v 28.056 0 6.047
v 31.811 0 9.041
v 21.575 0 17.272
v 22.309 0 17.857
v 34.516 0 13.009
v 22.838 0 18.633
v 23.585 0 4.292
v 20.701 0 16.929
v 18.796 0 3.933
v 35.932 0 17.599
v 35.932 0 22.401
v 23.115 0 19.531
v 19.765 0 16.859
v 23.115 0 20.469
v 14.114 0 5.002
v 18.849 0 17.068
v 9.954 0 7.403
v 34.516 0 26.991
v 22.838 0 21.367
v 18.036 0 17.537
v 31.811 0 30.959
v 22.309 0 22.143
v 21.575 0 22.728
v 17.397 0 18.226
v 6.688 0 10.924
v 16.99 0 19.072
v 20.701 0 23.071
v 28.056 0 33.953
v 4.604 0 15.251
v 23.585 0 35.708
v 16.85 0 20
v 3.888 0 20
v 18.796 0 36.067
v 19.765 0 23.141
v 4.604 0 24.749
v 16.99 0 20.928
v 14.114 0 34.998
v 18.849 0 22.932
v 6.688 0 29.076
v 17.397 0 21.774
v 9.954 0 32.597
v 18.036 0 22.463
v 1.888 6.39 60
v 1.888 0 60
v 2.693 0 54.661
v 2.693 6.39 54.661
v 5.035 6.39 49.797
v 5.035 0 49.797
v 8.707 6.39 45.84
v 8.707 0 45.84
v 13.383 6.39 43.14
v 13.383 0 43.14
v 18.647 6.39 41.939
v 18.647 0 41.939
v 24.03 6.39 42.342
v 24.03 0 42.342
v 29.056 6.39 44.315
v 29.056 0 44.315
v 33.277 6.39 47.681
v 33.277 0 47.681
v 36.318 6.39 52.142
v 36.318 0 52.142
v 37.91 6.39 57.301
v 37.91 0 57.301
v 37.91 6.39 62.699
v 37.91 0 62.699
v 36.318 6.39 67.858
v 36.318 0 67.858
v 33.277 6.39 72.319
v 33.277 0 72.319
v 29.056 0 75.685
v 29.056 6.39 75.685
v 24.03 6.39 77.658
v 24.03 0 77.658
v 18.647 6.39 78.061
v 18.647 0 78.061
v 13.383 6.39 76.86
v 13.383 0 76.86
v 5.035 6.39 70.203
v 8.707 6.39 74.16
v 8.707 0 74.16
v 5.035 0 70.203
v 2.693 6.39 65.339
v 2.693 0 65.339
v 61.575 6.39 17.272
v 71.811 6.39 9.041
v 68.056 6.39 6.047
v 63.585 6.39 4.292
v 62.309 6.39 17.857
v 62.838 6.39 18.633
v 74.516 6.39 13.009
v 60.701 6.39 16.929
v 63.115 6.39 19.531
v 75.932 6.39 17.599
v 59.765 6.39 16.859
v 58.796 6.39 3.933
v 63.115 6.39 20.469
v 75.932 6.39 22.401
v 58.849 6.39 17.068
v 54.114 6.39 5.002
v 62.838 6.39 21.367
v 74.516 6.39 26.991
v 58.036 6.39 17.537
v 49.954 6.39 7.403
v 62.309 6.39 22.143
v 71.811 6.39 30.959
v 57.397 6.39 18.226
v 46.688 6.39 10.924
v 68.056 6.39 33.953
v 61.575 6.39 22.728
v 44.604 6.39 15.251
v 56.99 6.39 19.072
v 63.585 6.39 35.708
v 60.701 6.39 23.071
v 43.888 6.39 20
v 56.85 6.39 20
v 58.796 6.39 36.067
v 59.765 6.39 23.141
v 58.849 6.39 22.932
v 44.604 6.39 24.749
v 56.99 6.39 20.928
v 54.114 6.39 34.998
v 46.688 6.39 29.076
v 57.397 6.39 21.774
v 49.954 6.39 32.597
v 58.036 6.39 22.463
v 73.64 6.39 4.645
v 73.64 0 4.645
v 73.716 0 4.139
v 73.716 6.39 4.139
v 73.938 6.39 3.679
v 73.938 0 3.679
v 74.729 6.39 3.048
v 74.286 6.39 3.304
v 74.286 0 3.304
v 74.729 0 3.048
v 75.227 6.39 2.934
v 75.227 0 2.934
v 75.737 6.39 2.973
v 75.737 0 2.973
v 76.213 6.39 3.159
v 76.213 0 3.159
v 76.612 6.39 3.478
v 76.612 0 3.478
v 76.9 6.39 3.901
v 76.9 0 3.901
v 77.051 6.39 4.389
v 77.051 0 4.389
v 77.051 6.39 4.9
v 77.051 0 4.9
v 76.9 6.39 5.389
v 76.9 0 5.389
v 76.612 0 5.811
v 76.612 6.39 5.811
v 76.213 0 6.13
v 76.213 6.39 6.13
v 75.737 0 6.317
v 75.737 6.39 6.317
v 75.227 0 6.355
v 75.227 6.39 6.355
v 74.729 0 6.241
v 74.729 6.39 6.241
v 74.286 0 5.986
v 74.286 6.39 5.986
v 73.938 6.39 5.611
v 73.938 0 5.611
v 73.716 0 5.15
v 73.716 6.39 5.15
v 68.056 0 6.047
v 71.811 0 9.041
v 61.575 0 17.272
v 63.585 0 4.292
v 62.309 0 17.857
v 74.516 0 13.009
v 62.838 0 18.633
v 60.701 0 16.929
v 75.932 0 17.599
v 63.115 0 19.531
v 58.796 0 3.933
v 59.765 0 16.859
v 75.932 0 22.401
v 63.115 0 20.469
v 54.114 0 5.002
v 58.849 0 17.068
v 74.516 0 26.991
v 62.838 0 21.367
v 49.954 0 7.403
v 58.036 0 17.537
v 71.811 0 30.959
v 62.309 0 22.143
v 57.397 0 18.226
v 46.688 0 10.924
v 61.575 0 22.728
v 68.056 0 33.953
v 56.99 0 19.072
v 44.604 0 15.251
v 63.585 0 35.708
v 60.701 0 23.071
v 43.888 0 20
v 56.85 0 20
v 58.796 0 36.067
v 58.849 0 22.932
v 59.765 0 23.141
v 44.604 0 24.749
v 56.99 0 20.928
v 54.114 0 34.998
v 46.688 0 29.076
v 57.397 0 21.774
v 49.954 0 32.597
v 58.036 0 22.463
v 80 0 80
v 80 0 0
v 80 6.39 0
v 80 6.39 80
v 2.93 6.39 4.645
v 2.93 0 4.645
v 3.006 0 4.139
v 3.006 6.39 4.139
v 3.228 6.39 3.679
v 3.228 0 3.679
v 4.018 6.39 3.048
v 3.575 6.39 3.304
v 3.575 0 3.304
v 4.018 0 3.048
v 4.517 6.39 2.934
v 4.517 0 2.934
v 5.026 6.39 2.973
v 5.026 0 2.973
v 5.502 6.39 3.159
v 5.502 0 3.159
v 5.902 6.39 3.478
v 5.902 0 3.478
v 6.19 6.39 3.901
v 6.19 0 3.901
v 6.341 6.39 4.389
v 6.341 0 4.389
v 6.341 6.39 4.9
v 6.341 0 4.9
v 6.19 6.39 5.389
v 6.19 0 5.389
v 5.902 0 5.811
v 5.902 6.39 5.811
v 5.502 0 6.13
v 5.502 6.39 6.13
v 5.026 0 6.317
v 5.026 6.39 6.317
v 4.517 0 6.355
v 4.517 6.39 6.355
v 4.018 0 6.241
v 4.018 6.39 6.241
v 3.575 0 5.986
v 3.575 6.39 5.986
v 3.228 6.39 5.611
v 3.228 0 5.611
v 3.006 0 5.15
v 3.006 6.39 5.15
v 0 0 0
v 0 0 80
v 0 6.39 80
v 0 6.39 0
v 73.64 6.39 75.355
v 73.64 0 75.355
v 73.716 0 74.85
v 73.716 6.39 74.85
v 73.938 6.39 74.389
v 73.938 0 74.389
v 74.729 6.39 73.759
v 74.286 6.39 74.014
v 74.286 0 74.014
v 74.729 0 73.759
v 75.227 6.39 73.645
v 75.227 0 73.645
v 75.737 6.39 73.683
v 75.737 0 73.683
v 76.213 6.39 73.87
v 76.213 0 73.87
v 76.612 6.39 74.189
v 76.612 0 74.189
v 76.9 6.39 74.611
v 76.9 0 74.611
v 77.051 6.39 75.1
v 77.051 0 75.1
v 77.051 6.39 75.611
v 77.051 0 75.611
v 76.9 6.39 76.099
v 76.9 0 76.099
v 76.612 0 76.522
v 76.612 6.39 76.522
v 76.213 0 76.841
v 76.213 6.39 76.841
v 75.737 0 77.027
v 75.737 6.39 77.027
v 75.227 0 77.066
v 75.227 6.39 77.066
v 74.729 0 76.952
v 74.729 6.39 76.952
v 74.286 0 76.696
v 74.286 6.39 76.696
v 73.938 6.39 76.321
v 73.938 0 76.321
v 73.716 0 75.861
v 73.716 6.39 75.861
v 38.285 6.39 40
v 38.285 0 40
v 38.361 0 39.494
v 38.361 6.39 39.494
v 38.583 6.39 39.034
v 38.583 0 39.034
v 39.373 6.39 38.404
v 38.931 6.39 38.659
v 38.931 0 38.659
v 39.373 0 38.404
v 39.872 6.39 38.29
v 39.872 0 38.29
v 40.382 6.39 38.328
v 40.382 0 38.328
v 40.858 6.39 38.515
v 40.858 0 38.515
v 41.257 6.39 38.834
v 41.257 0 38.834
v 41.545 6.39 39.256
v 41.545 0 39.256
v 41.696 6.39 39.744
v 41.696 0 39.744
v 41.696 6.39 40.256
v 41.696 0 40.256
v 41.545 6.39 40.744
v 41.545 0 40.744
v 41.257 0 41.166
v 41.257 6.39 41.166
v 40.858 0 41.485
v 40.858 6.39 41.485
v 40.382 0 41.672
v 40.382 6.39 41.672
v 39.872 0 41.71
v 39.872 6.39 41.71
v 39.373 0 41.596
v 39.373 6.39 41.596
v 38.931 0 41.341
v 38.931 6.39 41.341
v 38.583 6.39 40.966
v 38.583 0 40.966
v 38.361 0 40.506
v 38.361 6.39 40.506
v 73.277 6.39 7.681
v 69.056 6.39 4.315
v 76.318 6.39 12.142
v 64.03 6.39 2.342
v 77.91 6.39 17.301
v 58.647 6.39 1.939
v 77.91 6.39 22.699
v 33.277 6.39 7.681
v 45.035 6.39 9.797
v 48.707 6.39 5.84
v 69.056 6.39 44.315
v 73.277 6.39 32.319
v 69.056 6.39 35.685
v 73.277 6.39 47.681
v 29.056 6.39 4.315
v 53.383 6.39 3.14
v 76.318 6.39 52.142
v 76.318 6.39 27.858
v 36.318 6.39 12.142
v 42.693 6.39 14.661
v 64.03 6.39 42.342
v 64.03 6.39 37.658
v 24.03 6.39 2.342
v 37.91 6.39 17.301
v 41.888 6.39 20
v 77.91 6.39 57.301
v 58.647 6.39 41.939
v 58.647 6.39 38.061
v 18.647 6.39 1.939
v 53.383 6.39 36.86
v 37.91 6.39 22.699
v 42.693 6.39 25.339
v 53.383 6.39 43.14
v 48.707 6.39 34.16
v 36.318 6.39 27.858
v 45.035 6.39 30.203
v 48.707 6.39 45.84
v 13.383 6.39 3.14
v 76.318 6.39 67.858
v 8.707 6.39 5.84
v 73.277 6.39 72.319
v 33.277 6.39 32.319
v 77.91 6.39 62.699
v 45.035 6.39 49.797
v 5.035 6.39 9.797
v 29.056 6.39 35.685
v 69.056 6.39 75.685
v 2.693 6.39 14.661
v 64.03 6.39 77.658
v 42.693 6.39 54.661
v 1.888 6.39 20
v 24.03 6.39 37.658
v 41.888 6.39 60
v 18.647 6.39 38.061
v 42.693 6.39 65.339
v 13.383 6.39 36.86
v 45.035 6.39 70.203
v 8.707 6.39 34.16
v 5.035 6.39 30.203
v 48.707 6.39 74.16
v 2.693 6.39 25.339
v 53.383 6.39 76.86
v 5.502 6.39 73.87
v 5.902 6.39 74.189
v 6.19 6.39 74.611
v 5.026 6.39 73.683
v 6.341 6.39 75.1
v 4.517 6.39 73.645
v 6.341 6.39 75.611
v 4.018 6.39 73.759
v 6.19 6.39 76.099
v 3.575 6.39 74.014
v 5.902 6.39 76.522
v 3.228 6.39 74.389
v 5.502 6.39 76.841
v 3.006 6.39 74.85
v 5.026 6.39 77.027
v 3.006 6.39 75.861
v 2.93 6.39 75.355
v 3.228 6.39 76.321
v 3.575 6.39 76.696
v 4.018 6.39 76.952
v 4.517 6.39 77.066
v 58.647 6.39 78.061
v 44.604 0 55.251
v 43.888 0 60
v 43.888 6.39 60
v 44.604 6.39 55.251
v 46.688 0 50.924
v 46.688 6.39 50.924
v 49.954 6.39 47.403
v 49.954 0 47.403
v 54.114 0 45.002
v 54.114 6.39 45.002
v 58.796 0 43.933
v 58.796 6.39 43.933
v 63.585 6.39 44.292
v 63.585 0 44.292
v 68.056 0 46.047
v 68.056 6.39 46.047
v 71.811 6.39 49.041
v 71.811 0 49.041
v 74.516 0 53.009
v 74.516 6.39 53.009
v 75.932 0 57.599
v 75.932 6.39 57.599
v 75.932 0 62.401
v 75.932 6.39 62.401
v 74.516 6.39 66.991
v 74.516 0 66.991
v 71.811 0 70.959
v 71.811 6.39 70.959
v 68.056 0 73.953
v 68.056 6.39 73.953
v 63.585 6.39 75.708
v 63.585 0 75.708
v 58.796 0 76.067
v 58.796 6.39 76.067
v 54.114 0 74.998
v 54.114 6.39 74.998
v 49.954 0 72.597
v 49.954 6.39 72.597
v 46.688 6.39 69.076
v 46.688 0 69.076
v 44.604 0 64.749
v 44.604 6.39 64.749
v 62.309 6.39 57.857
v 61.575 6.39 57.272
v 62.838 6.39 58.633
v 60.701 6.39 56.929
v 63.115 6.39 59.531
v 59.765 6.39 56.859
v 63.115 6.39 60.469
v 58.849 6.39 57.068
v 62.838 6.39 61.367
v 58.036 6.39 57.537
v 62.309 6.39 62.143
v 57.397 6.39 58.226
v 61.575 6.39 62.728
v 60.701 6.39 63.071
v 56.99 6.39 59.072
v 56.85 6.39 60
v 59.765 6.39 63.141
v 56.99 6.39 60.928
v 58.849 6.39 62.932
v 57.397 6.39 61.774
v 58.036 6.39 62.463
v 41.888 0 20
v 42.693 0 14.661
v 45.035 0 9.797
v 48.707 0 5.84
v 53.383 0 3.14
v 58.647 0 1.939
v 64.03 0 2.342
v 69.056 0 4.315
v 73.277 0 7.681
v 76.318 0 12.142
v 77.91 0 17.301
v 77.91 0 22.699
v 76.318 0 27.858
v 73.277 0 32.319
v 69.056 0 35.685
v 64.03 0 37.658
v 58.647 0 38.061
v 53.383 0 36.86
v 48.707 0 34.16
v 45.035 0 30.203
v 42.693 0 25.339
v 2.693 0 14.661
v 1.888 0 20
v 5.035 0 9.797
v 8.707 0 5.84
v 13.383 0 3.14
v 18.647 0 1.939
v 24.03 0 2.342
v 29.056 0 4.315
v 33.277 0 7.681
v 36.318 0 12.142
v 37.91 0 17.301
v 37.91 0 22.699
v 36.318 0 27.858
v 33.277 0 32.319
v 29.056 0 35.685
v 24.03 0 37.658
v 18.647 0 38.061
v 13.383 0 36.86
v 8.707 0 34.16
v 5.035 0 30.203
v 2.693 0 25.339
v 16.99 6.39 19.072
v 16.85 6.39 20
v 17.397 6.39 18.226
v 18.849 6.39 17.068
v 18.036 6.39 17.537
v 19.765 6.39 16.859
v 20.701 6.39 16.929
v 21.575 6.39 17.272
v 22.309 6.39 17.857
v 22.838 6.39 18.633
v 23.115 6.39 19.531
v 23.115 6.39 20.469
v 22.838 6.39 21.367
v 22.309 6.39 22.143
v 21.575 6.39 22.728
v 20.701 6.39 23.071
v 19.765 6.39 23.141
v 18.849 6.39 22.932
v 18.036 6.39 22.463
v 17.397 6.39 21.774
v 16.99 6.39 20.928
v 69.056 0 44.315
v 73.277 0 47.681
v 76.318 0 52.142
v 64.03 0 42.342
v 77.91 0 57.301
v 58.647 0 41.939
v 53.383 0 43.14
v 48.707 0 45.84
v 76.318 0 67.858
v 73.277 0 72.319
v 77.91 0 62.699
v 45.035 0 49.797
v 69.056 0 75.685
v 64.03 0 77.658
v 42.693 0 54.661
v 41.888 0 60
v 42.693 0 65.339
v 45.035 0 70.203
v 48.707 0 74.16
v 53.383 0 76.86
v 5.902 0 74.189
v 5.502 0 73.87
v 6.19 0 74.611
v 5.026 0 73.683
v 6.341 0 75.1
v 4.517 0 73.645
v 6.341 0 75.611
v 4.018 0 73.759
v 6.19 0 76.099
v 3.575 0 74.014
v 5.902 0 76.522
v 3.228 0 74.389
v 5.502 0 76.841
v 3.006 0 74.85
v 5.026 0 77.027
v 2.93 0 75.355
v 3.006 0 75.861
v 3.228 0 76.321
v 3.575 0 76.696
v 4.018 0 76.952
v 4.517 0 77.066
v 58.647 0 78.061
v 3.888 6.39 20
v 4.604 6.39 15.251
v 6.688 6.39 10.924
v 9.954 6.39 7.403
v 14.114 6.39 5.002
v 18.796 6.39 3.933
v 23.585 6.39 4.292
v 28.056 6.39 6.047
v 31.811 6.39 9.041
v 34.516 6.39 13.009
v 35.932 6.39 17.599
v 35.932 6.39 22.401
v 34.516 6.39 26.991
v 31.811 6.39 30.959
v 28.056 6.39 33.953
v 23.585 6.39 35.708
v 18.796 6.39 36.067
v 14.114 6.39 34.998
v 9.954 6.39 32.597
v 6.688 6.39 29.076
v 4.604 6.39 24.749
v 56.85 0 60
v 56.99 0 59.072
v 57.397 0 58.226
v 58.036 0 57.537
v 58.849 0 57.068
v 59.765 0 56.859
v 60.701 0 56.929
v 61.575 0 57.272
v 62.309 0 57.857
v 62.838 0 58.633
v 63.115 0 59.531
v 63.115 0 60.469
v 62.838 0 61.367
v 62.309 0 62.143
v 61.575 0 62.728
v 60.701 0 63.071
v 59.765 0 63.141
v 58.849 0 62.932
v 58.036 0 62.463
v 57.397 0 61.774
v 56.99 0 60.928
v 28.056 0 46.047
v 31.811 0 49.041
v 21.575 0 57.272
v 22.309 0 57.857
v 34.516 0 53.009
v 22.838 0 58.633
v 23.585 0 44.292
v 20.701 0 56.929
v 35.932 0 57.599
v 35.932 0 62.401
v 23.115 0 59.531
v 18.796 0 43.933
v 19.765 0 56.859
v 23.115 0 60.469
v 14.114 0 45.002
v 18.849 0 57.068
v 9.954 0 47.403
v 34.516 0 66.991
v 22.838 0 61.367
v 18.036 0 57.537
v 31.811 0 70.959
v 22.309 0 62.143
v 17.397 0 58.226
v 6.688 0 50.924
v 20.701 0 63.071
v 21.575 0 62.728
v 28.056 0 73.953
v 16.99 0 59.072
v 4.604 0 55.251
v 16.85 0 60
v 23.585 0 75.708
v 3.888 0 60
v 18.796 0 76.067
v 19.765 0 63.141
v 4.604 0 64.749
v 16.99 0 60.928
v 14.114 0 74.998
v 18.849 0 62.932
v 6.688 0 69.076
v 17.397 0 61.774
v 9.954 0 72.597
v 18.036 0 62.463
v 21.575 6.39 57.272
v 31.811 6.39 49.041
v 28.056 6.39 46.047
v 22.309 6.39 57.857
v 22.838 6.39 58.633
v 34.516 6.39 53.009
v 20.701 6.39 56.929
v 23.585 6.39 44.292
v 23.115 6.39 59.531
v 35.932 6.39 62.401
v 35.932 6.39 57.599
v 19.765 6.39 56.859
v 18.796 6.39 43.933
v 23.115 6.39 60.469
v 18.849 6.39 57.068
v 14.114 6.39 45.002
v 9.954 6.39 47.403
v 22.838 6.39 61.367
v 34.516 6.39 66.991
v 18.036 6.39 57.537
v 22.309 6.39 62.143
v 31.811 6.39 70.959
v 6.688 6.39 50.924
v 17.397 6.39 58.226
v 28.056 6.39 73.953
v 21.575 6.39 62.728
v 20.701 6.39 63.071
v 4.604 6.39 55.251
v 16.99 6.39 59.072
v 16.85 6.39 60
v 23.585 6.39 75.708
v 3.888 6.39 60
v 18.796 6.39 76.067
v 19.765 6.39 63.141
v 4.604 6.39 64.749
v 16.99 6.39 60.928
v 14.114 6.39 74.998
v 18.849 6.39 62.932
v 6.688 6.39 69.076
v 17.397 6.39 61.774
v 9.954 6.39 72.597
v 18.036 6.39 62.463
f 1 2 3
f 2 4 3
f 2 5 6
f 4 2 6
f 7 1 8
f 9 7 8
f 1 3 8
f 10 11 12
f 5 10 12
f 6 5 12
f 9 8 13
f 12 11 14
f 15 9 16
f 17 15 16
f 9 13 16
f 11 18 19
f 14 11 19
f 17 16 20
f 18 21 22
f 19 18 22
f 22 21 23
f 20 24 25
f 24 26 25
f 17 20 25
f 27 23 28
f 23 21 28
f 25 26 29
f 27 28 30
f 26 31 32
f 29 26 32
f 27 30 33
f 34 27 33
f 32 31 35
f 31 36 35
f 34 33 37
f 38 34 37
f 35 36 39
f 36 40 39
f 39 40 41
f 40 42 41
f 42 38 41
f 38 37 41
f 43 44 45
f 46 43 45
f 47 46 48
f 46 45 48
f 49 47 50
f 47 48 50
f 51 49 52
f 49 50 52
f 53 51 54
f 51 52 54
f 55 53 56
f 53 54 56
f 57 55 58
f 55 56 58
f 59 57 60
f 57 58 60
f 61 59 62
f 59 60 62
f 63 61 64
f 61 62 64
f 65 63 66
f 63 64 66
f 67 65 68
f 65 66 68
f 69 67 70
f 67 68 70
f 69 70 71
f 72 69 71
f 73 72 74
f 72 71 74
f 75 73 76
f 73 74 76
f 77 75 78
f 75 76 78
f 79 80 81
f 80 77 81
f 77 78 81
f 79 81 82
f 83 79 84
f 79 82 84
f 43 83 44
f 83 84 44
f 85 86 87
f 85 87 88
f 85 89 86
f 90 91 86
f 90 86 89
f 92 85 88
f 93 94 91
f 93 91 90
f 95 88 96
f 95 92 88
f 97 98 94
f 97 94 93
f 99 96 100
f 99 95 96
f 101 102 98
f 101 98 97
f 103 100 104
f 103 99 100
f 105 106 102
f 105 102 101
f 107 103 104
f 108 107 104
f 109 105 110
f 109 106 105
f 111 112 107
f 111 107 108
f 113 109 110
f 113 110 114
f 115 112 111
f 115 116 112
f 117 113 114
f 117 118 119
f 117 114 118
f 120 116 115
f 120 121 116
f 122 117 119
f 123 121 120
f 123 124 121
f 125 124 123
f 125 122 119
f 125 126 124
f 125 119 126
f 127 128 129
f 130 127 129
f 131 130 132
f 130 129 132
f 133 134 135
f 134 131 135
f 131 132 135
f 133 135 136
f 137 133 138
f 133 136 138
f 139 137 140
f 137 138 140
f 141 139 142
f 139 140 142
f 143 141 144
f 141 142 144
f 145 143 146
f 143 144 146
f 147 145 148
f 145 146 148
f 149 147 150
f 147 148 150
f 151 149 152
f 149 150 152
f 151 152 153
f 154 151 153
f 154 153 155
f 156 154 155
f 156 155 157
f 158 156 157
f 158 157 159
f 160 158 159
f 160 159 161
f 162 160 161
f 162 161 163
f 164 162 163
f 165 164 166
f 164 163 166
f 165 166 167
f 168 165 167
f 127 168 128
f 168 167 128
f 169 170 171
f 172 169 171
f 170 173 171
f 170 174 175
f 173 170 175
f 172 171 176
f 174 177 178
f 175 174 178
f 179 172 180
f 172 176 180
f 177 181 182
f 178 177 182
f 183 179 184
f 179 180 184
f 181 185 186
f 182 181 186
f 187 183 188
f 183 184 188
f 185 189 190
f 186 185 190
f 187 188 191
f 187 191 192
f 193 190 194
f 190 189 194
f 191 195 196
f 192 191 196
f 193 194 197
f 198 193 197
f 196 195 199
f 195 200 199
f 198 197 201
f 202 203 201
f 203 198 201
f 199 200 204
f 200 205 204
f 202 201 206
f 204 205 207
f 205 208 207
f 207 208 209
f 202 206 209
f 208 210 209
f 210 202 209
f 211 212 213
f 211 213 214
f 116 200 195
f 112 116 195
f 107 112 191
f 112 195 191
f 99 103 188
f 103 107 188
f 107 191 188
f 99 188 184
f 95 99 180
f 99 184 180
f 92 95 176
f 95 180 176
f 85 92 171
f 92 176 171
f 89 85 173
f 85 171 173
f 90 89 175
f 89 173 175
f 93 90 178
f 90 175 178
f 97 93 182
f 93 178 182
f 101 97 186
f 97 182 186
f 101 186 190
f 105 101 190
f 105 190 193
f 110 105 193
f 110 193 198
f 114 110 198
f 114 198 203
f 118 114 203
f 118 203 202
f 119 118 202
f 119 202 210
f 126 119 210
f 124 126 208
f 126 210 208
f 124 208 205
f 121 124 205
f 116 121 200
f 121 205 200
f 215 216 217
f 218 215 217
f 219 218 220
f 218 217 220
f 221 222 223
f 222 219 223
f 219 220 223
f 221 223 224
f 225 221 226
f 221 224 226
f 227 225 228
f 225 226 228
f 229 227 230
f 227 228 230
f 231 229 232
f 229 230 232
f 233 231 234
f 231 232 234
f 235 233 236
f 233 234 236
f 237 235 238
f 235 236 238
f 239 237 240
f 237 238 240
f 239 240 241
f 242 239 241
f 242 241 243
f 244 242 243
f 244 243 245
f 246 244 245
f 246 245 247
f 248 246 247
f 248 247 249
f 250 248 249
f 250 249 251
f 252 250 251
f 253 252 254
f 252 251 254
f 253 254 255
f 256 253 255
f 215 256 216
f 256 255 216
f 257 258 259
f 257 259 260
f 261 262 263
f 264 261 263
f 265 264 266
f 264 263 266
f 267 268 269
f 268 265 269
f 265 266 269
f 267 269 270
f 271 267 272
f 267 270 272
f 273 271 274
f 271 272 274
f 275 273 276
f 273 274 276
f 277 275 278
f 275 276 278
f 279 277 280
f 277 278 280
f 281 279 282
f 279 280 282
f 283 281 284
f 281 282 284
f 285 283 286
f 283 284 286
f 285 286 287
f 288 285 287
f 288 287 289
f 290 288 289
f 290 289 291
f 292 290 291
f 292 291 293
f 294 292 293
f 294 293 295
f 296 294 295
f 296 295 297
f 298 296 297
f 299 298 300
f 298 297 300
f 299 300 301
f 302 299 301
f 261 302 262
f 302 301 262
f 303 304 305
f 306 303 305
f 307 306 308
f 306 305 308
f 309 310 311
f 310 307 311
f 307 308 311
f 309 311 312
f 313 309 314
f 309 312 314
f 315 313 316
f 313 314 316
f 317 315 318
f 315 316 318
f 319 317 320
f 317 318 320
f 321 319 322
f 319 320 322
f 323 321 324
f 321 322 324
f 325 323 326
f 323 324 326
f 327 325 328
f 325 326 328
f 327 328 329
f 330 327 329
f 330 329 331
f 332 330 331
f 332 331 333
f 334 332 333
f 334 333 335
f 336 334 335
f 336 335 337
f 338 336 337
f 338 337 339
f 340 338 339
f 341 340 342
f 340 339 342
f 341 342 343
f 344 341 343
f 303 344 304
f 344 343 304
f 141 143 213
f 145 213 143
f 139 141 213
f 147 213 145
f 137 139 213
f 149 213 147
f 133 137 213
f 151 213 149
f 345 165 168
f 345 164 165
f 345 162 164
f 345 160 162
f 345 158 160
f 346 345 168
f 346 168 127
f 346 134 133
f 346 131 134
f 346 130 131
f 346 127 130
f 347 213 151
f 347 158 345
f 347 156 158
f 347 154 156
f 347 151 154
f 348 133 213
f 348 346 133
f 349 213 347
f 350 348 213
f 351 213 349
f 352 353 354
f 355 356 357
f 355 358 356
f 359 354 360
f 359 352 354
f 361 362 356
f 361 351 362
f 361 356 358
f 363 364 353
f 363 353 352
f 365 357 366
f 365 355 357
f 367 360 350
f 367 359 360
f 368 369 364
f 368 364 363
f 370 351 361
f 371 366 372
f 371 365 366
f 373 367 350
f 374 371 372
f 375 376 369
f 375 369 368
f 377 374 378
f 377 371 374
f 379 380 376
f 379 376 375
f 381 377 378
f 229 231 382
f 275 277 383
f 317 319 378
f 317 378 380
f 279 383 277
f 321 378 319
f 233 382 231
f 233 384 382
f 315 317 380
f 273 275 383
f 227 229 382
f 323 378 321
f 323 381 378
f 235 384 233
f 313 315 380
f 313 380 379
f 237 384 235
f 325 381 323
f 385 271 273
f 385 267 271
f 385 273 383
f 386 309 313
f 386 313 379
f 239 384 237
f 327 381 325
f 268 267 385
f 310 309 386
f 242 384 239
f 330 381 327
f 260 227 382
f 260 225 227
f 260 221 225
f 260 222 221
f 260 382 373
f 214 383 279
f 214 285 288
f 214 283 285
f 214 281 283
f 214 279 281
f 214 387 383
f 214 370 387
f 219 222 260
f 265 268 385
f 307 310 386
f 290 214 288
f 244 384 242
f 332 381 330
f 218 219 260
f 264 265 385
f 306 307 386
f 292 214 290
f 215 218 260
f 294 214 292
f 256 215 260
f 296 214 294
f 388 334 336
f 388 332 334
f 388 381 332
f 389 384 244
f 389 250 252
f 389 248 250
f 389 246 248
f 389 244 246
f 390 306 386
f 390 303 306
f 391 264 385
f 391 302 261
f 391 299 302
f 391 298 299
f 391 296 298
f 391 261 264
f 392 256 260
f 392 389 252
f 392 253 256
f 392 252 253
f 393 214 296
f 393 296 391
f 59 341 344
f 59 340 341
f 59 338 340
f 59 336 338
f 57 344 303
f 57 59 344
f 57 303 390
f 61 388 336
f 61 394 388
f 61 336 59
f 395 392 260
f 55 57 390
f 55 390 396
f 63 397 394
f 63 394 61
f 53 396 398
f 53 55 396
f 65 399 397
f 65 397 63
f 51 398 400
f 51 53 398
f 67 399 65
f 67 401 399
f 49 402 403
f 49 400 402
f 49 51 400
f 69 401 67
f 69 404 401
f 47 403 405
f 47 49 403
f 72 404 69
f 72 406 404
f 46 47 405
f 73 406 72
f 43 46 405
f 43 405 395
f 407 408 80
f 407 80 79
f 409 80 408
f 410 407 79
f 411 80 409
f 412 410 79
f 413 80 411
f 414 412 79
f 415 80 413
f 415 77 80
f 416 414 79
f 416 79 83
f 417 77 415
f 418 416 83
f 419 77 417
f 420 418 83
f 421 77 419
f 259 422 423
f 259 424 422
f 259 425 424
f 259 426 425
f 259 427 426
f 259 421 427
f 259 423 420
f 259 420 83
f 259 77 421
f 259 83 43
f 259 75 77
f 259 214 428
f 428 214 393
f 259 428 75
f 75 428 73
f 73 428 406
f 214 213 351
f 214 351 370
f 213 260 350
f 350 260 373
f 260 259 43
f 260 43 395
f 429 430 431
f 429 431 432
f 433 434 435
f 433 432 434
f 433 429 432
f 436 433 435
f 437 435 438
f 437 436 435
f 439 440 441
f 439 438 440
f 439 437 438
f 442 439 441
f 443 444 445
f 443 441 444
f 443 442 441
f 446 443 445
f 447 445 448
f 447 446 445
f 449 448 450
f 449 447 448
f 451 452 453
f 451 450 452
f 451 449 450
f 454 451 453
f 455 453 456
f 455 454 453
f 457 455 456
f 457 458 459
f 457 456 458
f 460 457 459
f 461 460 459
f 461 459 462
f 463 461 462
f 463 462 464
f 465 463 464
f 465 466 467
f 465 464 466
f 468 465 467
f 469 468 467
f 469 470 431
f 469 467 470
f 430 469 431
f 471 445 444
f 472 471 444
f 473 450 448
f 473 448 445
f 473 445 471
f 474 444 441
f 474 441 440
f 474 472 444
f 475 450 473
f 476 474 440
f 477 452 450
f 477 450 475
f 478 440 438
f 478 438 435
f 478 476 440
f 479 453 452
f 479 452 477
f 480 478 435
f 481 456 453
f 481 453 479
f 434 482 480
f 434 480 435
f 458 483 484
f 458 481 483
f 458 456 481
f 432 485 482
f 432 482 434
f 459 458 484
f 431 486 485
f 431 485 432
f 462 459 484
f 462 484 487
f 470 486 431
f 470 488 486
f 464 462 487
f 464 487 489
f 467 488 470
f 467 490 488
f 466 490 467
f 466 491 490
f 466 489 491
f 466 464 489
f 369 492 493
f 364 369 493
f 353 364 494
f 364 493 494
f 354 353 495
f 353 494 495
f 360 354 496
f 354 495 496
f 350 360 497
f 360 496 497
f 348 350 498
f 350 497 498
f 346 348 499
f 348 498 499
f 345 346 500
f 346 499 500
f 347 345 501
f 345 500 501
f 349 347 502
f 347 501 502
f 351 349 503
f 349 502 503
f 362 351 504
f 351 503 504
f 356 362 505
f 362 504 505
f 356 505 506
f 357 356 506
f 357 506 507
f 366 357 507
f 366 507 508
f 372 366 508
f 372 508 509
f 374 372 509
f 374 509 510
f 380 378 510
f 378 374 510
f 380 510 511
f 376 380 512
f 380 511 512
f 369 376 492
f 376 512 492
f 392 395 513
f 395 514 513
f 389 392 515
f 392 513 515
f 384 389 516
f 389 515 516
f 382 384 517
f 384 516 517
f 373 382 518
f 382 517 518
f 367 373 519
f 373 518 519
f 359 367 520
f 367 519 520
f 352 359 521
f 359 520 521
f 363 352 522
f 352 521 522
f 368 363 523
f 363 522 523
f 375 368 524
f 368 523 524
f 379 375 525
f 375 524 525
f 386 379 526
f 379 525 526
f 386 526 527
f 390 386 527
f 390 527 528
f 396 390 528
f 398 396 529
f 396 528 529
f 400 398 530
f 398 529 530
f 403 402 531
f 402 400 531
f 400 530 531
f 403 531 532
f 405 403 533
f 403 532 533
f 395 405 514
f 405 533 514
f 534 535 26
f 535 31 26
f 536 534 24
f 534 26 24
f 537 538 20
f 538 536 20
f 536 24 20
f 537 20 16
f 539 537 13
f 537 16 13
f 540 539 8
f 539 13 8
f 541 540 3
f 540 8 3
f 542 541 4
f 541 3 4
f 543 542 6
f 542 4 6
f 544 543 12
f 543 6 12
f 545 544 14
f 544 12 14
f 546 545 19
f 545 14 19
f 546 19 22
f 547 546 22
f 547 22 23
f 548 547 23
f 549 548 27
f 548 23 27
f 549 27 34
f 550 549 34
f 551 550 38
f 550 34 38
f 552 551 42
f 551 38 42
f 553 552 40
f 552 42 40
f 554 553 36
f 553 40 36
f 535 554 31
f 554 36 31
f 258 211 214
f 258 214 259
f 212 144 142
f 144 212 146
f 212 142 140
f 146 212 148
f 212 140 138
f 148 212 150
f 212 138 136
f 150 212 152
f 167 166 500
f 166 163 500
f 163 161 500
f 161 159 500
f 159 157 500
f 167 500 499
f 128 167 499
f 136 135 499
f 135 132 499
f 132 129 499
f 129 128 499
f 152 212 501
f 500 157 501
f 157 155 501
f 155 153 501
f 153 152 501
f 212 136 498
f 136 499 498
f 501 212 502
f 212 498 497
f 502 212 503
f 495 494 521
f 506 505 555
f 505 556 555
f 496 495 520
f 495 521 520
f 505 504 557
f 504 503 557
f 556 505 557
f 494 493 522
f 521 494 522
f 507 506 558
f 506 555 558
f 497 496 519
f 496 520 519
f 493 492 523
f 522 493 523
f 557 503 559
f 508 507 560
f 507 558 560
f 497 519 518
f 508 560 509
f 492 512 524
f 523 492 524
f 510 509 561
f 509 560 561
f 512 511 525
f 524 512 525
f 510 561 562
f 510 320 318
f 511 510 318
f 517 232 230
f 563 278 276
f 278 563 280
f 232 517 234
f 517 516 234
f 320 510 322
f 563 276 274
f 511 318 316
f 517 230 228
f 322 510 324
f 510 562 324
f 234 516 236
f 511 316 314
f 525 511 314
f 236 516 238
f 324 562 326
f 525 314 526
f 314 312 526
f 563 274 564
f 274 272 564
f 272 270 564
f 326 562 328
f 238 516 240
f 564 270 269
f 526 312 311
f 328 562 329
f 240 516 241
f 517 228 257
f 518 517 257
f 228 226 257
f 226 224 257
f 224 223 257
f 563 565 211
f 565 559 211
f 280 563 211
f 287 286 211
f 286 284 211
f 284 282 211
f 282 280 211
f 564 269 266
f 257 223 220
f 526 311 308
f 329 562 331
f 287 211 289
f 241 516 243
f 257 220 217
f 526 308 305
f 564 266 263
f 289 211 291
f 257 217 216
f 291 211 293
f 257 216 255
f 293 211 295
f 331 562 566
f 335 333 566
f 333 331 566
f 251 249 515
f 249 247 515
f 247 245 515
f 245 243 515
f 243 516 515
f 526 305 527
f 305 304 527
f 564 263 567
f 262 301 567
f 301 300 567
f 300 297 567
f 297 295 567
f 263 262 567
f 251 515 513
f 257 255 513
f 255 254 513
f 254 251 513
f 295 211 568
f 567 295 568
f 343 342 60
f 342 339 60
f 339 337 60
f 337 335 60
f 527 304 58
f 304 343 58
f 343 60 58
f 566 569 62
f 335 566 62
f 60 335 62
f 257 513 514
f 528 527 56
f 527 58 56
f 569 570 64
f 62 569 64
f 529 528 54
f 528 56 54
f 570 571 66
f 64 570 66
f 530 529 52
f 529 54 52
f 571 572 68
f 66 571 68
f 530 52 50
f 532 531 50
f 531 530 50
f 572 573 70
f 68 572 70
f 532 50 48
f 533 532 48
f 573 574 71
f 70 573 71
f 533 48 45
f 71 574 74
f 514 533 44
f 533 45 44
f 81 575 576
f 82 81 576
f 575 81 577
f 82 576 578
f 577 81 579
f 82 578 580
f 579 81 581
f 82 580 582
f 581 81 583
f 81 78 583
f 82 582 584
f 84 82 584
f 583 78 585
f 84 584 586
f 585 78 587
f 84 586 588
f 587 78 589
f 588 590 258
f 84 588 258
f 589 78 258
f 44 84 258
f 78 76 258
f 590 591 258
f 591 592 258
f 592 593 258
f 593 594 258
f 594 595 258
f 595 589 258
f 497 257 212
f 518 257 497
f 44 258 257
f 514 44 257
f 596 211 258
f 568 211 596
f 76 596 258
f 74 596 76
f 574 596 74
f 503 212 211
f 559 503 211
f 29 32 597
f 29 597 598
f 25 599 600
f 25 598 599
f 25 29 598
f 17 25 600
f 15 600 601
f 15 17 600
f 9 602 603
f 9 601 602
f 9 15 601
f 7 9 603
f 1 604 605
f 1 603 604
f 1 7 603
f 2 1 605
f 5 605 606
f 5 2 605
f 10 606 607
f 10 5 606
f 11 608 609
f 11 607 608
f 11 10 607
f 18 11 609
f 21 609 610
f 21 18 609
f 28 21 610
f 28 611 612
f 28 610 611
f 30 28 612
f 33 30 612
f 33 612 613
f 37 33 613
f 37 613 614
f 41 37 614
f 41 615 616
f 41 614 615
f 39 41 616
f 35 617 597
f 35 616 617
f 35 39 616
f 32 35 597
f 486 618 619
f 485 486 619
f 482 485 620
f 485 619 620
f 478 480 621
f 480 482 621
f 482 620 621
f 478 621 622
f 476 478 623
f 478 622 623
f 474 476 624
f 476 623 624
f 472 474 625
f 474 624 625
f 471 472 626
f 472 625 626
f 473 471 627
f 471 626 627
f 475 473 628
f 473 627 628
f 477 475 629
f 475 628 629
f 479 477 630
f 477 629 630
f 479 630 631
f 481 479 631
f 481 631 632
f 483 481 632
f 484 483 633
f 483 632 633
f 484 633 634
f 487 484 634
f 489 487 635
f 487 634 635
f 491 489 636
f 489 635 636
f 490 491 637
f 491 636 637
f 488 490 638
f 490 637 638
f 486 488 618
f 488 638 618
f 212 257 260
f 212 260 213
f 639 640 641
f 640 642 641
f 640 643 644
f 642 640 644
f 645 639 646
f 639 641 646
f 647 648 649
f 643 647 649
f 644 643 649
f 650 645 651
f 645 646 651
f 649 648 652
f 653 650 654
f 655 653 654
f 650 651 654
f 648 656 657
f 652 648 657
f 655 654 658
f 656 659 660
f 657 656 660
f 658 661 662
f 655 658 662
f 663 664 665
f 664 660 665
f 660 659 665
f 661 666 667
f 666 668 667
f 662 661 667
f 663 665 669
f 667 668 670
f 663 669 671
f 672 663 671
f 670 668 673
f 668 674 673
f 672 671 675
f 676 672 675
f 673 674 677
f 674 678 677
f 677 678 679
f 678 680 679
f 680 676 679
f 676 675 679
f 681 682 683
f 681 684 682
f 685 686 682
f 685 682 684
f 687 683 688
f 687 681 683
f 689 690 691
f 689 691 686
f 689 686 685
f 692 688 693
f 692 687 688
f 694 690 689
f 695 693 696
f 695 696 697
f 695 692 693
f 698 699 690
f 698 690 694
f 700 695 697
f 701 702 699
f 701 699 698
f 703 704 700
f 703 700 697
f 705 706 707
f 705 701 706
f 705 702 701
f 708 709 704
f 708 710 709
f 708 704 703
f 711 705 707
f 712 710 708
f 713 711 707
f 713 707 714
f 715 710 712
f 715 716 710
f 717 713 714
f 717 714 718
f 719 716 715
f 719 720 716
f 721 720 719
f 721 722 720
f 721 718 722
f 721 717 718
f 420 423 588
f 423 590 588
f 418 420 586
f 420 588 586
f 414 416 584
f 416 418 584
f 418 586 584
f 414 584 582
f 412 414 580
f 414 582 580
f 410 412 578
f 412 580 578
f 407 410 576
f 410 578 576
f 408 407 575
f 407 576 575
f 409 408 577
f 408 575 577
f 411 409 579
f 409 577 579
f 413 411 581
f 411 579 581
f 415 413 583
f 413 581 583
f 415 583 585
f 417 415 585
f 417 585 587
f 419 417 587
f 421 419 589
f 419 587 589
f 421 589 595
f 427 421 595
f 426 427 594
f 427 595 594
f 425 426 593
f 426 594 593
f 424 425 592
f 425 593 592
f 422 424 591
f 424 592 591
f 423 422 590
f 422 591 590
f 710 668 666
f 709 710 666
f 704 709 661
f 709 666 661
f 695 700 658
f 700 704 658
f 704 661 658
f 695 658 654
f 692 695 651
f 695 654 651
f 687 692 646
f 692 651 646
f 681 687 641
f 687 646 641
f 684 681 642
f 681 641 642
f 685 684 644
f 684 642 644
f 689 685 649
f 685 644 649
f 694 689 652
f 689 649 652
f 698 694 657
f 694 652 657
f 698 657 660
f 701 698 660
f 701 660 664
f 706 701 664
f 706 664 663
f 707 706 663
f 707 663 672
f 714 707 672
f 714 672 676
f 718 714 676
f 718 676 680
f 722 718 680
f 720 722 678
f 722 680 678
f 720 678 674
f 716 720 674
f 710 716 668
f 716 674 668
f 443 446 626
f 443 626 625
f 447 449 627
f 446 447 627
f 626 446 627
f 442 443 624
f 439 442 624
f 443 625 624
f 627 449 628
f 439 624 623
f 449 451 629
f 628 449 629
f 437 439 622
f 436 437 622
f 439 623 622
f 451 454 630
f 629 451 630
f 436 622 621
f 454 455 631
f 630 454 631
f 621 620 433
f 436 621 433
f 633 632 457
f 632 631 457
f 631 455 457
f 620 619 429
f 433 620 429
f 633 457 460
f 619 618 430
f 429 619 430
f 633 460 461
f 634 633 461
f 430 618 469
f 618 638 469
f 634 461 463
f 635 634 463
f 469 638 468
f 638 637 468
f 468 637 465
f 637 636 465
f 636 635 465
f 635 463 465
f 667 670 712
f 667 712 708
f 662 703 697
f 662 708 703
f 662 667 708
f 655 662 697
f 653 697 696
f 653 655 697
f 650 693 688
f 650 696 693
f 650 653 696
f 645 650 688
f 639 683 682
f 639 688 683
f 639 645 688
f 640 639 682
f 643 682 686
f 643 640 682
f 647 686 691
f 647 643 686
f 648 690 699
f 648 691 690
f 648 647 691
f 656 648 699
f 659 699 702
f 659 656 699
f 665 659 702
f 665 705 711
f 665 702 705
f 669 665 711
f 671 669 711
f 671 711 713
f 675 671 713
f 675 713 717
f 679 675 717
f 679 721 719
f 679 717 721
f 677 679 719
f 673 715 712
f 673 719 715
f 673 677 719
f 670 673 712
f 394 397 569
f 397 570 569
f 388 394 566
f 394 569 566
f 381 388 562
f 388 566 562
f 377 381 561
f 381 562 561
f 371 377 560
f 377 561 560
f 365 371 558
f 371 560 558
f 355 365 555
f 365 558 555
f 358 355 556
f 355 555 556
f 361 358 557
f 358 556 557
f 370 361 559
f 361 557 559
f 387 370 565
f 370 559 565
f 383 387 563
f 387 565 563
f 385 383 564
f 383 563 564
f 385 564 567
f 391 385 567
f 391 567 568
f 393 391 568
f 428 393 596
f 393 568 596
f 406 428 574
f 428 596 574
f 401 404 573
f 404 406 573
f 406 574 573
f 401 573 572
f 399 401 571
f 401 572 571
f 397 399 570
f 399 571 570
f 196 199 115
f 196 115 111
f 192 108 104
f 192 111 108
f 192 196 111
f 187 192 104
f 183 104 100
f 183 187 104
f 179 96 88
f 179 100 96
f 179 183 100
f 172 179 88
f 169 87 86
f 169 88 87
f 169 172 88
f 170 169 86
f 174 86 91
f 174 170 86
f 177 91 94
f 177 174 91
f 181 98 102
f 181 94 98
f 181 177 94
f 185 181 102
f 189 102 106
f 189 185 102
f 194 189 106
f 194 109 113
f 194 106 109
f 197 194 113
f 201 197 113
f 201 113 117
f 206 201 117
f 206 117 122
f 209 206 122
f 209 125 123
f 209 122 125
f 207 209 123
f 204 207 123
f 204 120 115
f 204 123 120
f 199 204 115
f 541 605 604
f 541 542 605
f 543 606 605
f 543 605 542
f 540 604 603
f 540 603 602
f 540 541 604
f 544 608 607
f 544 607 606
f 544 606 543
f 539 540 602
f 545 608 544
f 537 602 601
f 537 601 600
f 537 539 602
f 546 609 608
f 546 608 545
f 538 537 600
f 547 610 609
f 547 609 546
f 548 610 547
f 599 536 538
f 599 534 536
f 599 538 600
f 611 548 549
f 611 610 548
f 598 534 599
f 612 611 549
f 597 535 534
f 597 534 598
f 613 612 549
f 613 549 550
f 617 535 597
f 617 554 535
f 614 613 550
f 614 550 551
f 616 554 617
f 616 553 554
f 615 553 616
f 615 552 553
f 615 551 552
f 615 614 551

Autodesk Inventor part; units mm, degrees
ref_plane "YZ Plane" through (0, 0, 0) normal (1, 0, 0) x (0, 1, 0)
ref_plane "XZ Plane" through (0, 0, 0) normal (0, 1, 0) x (-1, 0, 0)
ref_plane "XY Plane" through (0, 0, 0) normal (0, 0, 1) x (1, 0, 0)
sketch "Sketch1" plane through (0, 0, 0) normal (0, 1, 0) x (-1, 0, 0)
  line L0 (0, 0) -> (-80, 0)
  line L1 (-80, 0) -> (-80, 80)
  line L2 (-80, 80) -> (0, 80)
  line L3 (0, 80) -> (0, 0)
  line L4 (0, 40) -> (-40, 40) construction
  line L5 (-40, 40) -> (-40, 80) construction
  line L6 (-40, 40) -> (-80, 40) construction
  line L7 (-40, 40) -> (-40, 0) construction
  circle A0 centre (-20, 20) radius 18.1118
  circle A1 centre (-20, 20) radius 16.1118
  circle A2 centre (-20, 20) radius 3.15
  circle A3 centre (-4.6447, 4.6447) radius 1.715
  line L8 (-40, 40) -> (0, 0) construction
  circle A4 centre (-20, 60) radius 18.1118
  circle A5 centre (-20, 60) radius 16.1118
  circle A6 centre (-20, 60) radius 3.15
  circle A7 centre (-4.6447, 75.3553) radius 1.715
  circle A8 centre (-60, 20) radius 18.1118
  circle A9 centre (-60, 20) radius 16.1118
  circle A10 centre (-60, 20) radius 3.15
  circle A11 centre (-75.3553, 4.6447) radius 1.715
  circle A12 centre (-75.3553, 75.3553) radius 1.715
  circle A13 centre (-60, 60) radius 18.1118
  circle A14 centre (-60, 60) radius 16.1118
  circle A15 centre (-60, 60) radius 3.15
  circle A16 centre (-40, 40) radius 1.715
  point P0 (-20, 40)
  point P1 (-40, 20)
  dimension "d0" = 80
  dimension "d1" = 80
  dimension "d2" = 36.2235
  dimension "d3" = 2
  dimension "d4" = 6.3
  dimension "d5" = 3.43
  dimension "d6" = 50
  dimension "d7" = 3.43
extrude "Extrusion1" add sketch "Sketch1" along normal blind 6.39
equation "\"d0\" = VccumCoverSize"
equation "\"d1\" = VccumCoverSize"
equation "\"d2\" = SiliconeRingDiameter"
equation "\"d3\" = SiliconeOverlapThickness"
equation "\"d4\" = DowlDiameter"
equation "\"d5\" = HoldScrewDiameter"
equation "\"d7\" = HoldScrewDiameter"
equation "\"d8\" = WoodThickness"
equation "\"SiliconeOverlapThickness\" = 2"
equation "\"VccumCoverSize\" = 80"
equation "\"SiliconeRingDiameter\" = 36.2235"
equation "\"DowlDiameter\" = 6.3"
equation "\"HoldScrewDiameter\" = 3.43"
equation "\"WoodThickness\" = 6.39"
properties part number "MotorSiliconeMold_2" material "MDF Medium Density Fiberboard"
